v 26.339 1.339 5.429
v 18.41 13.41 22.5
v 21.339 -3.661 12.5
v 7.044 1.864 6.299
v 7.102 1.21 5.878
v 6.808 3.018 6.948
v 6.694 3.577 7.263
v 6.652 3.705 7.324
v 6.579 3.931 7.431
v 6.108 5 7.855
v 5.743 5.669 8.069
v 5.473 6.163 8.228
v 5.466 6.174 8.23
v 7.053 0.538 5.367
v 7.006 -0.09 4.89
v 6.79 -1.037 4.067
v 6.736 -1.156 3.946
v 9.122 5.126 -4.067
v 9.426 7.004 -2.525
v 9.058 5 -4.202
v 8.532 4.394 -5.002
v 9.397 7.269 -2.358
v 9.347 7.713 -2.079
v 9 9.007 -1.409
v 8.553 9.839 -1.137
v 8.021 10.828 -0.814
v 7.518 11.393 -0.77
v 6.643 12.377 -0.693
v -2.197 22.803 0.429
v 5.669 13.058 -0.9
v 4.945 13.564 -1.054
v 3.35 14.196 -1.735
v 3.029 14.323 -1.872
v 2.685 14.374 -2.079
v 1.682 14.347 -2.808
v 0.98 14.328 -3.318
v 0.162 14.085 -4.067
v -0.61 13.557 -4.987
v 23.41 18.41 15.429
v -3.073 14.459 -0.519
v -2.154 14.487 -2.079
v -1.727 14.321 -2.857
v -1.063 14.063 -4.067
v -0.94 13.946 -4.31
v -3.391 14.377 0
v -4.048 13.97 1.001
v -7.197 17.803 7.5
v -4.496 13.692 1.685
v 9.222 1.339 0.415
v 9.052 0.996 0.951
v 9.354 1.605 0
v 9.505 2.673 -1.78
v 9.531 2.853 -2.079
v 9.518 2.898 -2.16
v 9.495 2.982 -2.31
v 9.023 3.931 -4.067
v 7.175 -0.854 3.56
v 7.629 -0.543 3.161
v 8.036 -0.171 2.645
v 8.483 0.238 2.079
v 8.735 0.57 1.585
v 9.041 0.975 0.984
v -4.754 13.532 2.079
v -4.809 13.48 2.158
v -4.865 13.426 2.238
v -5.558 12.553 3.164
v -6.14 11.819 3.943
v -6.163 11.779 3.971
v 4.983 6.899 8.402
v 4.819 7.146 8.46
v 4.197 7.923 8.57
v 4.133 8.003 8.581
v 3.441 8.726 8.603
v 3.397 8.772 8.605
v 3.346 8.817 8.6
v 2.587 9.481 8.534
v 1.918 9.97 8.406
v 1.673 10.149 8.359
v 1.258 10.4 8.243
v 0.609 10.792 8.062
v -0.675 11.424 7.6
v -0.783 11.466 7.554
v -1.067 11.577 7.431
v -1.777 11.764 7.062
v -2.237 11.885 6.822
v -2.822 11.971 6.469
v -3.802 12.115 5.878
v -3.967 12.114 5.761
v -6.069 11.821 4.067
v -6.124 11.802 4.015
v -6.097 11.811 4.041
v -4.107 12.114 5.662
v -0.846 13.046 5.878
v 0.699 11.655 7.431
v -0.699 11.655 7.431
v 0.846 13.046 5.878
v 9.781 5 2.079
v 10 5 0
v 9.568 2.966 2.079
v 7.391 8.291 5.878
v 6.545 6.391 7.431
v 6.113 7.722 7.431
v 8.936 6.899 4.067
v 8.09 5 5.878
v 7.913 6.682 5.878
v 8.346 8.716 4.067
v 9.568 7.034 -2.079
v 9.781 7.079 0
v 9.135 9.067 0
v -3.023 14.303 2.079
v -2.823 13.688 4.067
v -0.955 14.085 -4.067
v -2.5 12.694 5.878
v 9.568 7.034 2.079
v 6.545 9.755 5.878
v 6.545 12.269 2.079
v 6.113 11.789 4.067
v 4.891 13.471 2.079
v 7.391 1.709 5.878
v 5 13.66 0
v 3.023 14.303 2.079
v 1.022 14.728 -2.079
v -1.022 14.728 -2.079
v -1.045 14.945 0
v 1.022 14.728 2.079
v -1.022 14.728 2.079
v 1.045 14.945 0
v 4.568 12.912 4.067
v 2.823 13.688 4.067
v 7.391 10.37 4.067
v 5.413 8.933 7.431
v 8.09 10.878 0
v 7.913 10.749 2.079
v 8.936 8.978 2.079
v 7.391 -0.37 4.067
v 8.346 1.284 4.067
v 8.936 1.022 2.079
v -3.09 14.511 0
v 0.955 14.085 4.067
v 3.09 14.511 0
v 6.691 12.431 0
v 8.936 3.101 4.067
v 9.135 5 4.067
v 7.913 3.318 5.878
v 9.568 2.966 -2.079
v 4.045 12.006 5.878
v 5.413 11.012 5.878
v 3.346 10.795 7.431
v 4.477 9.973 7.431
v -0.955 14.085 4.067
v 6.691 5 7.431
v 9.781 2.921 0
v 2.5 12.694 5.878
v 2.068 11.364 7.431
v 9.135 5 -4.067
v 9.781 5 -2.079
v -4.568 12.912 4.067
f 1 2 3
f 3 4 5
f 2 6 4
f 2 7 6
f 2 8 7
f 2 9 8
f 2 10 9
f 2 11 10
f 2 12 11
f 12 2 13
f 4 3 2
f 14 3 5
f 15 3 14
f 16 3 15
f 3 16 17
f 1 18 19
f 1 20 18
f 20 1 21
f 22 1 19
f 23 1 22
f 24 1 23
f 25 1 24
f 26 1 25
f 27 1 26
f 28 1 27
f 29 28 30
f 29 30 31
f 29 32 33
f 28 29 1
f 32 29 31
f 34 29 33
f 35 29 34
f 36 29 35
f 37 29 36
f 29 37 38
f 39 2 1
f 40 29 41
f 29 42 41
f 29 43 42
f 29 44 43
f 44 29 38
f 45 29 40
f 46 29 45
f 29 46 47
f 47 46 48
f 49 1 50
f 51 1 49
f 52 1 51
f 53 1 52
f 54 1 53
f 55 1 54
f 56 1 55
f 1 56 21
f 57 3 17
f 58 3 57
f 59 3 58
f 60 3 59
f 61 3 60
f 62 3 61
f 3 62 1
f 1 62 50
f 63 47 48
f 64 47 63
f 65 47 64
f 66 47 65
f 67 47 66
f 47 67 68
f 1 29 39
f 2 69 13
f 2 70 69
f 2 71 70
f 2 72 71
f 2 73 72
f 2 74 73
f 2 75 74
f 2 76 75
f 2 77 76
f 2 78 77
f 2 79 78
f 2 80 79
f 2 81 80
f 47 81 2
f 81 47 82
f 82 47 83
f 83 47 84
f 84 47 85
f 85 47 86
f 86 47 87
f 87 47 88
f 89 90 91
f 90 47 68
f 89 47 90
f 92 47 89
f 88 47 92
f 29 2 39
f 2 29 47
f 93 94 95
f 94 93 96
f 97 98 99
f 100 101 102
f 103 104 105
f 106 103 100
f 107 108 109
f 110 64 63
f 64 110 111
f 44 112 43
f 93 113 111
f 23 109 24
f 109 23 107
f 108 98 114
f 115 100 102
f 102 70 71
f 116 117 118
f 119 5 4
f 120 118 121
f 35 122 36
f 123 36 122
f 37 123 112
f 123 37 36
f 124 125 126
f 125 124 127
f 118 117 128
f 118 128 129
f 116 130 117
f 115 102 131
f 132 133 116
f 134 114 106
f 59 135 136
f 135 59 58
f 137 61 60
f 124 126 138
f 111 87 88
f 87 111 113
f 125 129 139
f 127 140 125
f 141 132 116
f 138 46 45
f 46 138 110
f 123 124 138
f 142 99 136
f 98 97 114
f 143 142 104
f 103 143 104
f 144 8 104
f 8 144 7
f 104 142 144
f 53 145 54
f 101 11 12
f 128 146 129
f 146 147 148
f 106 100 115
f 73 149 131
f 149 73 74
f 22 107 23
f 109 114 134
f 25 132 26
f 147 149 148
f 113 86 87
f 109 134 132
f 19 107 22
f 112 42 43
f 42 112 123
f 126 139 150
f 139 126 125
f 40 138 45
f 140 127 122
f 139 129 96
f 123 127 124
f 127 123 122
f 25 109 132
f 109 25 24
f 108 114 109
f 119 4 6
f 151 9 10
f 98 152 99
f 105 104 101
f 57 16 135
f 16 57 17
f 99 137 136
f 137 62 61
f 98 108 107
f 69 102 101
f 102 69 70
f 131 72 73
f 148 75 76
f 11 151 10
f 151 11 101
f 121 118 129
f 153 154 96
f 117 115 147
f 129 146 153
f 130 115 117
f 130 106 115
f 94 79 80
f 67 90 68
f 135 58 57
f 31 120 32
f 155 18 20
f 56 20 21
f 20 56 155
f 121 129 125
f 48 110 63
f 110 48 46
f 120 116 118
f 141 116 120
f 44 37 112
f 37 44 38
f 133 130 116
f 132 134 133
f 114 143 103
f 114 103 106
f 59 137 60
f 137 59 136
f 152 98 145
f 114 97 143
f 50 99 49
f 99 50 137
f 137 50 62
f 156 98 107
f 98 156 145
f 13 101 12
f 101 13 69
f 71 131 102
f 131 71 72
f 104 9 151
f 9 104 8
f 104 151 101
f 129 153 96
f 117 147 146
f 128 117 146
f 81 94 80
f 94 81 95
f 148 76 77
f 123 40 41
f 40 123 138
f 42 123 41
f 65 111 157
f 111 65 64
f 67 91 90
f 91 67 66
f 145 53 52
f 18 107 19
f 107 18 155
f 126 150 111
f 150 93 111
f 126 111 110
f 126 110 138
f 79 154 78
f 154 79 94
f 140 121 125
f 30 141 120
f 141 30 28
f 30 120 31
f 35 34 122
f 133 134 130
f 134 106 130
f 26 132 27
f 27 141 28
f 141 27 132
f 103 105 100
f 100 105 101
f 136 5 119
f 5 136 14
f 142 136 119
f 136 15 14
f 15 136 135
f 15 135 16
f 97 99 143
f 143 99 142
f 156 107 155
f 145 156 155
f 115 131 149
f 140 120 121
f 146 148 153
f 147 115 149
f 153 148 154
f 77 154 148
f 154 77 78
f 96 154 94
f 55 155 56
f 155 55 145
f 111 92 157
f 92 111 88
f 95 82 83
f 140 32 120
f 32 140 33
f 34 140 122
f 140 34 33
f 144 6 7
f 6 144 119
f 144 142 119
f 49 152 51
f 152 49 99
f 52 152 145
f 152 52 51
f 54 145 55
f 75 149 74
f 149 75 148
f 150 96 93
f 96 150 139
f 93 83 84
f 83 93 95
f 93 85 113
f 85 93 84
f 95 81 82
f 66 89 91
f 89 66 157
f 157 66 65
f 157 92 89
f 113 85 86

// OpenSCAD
difference() {
	rotate(a = [45, 45, 45]) {
		translate(v = [0, 0, -5]) {
			cube(size = [10, 20, 30]);
		}
	}
	#translate(v = [0, 5, 0]) {
		sphere(r = 10);
	}
}
